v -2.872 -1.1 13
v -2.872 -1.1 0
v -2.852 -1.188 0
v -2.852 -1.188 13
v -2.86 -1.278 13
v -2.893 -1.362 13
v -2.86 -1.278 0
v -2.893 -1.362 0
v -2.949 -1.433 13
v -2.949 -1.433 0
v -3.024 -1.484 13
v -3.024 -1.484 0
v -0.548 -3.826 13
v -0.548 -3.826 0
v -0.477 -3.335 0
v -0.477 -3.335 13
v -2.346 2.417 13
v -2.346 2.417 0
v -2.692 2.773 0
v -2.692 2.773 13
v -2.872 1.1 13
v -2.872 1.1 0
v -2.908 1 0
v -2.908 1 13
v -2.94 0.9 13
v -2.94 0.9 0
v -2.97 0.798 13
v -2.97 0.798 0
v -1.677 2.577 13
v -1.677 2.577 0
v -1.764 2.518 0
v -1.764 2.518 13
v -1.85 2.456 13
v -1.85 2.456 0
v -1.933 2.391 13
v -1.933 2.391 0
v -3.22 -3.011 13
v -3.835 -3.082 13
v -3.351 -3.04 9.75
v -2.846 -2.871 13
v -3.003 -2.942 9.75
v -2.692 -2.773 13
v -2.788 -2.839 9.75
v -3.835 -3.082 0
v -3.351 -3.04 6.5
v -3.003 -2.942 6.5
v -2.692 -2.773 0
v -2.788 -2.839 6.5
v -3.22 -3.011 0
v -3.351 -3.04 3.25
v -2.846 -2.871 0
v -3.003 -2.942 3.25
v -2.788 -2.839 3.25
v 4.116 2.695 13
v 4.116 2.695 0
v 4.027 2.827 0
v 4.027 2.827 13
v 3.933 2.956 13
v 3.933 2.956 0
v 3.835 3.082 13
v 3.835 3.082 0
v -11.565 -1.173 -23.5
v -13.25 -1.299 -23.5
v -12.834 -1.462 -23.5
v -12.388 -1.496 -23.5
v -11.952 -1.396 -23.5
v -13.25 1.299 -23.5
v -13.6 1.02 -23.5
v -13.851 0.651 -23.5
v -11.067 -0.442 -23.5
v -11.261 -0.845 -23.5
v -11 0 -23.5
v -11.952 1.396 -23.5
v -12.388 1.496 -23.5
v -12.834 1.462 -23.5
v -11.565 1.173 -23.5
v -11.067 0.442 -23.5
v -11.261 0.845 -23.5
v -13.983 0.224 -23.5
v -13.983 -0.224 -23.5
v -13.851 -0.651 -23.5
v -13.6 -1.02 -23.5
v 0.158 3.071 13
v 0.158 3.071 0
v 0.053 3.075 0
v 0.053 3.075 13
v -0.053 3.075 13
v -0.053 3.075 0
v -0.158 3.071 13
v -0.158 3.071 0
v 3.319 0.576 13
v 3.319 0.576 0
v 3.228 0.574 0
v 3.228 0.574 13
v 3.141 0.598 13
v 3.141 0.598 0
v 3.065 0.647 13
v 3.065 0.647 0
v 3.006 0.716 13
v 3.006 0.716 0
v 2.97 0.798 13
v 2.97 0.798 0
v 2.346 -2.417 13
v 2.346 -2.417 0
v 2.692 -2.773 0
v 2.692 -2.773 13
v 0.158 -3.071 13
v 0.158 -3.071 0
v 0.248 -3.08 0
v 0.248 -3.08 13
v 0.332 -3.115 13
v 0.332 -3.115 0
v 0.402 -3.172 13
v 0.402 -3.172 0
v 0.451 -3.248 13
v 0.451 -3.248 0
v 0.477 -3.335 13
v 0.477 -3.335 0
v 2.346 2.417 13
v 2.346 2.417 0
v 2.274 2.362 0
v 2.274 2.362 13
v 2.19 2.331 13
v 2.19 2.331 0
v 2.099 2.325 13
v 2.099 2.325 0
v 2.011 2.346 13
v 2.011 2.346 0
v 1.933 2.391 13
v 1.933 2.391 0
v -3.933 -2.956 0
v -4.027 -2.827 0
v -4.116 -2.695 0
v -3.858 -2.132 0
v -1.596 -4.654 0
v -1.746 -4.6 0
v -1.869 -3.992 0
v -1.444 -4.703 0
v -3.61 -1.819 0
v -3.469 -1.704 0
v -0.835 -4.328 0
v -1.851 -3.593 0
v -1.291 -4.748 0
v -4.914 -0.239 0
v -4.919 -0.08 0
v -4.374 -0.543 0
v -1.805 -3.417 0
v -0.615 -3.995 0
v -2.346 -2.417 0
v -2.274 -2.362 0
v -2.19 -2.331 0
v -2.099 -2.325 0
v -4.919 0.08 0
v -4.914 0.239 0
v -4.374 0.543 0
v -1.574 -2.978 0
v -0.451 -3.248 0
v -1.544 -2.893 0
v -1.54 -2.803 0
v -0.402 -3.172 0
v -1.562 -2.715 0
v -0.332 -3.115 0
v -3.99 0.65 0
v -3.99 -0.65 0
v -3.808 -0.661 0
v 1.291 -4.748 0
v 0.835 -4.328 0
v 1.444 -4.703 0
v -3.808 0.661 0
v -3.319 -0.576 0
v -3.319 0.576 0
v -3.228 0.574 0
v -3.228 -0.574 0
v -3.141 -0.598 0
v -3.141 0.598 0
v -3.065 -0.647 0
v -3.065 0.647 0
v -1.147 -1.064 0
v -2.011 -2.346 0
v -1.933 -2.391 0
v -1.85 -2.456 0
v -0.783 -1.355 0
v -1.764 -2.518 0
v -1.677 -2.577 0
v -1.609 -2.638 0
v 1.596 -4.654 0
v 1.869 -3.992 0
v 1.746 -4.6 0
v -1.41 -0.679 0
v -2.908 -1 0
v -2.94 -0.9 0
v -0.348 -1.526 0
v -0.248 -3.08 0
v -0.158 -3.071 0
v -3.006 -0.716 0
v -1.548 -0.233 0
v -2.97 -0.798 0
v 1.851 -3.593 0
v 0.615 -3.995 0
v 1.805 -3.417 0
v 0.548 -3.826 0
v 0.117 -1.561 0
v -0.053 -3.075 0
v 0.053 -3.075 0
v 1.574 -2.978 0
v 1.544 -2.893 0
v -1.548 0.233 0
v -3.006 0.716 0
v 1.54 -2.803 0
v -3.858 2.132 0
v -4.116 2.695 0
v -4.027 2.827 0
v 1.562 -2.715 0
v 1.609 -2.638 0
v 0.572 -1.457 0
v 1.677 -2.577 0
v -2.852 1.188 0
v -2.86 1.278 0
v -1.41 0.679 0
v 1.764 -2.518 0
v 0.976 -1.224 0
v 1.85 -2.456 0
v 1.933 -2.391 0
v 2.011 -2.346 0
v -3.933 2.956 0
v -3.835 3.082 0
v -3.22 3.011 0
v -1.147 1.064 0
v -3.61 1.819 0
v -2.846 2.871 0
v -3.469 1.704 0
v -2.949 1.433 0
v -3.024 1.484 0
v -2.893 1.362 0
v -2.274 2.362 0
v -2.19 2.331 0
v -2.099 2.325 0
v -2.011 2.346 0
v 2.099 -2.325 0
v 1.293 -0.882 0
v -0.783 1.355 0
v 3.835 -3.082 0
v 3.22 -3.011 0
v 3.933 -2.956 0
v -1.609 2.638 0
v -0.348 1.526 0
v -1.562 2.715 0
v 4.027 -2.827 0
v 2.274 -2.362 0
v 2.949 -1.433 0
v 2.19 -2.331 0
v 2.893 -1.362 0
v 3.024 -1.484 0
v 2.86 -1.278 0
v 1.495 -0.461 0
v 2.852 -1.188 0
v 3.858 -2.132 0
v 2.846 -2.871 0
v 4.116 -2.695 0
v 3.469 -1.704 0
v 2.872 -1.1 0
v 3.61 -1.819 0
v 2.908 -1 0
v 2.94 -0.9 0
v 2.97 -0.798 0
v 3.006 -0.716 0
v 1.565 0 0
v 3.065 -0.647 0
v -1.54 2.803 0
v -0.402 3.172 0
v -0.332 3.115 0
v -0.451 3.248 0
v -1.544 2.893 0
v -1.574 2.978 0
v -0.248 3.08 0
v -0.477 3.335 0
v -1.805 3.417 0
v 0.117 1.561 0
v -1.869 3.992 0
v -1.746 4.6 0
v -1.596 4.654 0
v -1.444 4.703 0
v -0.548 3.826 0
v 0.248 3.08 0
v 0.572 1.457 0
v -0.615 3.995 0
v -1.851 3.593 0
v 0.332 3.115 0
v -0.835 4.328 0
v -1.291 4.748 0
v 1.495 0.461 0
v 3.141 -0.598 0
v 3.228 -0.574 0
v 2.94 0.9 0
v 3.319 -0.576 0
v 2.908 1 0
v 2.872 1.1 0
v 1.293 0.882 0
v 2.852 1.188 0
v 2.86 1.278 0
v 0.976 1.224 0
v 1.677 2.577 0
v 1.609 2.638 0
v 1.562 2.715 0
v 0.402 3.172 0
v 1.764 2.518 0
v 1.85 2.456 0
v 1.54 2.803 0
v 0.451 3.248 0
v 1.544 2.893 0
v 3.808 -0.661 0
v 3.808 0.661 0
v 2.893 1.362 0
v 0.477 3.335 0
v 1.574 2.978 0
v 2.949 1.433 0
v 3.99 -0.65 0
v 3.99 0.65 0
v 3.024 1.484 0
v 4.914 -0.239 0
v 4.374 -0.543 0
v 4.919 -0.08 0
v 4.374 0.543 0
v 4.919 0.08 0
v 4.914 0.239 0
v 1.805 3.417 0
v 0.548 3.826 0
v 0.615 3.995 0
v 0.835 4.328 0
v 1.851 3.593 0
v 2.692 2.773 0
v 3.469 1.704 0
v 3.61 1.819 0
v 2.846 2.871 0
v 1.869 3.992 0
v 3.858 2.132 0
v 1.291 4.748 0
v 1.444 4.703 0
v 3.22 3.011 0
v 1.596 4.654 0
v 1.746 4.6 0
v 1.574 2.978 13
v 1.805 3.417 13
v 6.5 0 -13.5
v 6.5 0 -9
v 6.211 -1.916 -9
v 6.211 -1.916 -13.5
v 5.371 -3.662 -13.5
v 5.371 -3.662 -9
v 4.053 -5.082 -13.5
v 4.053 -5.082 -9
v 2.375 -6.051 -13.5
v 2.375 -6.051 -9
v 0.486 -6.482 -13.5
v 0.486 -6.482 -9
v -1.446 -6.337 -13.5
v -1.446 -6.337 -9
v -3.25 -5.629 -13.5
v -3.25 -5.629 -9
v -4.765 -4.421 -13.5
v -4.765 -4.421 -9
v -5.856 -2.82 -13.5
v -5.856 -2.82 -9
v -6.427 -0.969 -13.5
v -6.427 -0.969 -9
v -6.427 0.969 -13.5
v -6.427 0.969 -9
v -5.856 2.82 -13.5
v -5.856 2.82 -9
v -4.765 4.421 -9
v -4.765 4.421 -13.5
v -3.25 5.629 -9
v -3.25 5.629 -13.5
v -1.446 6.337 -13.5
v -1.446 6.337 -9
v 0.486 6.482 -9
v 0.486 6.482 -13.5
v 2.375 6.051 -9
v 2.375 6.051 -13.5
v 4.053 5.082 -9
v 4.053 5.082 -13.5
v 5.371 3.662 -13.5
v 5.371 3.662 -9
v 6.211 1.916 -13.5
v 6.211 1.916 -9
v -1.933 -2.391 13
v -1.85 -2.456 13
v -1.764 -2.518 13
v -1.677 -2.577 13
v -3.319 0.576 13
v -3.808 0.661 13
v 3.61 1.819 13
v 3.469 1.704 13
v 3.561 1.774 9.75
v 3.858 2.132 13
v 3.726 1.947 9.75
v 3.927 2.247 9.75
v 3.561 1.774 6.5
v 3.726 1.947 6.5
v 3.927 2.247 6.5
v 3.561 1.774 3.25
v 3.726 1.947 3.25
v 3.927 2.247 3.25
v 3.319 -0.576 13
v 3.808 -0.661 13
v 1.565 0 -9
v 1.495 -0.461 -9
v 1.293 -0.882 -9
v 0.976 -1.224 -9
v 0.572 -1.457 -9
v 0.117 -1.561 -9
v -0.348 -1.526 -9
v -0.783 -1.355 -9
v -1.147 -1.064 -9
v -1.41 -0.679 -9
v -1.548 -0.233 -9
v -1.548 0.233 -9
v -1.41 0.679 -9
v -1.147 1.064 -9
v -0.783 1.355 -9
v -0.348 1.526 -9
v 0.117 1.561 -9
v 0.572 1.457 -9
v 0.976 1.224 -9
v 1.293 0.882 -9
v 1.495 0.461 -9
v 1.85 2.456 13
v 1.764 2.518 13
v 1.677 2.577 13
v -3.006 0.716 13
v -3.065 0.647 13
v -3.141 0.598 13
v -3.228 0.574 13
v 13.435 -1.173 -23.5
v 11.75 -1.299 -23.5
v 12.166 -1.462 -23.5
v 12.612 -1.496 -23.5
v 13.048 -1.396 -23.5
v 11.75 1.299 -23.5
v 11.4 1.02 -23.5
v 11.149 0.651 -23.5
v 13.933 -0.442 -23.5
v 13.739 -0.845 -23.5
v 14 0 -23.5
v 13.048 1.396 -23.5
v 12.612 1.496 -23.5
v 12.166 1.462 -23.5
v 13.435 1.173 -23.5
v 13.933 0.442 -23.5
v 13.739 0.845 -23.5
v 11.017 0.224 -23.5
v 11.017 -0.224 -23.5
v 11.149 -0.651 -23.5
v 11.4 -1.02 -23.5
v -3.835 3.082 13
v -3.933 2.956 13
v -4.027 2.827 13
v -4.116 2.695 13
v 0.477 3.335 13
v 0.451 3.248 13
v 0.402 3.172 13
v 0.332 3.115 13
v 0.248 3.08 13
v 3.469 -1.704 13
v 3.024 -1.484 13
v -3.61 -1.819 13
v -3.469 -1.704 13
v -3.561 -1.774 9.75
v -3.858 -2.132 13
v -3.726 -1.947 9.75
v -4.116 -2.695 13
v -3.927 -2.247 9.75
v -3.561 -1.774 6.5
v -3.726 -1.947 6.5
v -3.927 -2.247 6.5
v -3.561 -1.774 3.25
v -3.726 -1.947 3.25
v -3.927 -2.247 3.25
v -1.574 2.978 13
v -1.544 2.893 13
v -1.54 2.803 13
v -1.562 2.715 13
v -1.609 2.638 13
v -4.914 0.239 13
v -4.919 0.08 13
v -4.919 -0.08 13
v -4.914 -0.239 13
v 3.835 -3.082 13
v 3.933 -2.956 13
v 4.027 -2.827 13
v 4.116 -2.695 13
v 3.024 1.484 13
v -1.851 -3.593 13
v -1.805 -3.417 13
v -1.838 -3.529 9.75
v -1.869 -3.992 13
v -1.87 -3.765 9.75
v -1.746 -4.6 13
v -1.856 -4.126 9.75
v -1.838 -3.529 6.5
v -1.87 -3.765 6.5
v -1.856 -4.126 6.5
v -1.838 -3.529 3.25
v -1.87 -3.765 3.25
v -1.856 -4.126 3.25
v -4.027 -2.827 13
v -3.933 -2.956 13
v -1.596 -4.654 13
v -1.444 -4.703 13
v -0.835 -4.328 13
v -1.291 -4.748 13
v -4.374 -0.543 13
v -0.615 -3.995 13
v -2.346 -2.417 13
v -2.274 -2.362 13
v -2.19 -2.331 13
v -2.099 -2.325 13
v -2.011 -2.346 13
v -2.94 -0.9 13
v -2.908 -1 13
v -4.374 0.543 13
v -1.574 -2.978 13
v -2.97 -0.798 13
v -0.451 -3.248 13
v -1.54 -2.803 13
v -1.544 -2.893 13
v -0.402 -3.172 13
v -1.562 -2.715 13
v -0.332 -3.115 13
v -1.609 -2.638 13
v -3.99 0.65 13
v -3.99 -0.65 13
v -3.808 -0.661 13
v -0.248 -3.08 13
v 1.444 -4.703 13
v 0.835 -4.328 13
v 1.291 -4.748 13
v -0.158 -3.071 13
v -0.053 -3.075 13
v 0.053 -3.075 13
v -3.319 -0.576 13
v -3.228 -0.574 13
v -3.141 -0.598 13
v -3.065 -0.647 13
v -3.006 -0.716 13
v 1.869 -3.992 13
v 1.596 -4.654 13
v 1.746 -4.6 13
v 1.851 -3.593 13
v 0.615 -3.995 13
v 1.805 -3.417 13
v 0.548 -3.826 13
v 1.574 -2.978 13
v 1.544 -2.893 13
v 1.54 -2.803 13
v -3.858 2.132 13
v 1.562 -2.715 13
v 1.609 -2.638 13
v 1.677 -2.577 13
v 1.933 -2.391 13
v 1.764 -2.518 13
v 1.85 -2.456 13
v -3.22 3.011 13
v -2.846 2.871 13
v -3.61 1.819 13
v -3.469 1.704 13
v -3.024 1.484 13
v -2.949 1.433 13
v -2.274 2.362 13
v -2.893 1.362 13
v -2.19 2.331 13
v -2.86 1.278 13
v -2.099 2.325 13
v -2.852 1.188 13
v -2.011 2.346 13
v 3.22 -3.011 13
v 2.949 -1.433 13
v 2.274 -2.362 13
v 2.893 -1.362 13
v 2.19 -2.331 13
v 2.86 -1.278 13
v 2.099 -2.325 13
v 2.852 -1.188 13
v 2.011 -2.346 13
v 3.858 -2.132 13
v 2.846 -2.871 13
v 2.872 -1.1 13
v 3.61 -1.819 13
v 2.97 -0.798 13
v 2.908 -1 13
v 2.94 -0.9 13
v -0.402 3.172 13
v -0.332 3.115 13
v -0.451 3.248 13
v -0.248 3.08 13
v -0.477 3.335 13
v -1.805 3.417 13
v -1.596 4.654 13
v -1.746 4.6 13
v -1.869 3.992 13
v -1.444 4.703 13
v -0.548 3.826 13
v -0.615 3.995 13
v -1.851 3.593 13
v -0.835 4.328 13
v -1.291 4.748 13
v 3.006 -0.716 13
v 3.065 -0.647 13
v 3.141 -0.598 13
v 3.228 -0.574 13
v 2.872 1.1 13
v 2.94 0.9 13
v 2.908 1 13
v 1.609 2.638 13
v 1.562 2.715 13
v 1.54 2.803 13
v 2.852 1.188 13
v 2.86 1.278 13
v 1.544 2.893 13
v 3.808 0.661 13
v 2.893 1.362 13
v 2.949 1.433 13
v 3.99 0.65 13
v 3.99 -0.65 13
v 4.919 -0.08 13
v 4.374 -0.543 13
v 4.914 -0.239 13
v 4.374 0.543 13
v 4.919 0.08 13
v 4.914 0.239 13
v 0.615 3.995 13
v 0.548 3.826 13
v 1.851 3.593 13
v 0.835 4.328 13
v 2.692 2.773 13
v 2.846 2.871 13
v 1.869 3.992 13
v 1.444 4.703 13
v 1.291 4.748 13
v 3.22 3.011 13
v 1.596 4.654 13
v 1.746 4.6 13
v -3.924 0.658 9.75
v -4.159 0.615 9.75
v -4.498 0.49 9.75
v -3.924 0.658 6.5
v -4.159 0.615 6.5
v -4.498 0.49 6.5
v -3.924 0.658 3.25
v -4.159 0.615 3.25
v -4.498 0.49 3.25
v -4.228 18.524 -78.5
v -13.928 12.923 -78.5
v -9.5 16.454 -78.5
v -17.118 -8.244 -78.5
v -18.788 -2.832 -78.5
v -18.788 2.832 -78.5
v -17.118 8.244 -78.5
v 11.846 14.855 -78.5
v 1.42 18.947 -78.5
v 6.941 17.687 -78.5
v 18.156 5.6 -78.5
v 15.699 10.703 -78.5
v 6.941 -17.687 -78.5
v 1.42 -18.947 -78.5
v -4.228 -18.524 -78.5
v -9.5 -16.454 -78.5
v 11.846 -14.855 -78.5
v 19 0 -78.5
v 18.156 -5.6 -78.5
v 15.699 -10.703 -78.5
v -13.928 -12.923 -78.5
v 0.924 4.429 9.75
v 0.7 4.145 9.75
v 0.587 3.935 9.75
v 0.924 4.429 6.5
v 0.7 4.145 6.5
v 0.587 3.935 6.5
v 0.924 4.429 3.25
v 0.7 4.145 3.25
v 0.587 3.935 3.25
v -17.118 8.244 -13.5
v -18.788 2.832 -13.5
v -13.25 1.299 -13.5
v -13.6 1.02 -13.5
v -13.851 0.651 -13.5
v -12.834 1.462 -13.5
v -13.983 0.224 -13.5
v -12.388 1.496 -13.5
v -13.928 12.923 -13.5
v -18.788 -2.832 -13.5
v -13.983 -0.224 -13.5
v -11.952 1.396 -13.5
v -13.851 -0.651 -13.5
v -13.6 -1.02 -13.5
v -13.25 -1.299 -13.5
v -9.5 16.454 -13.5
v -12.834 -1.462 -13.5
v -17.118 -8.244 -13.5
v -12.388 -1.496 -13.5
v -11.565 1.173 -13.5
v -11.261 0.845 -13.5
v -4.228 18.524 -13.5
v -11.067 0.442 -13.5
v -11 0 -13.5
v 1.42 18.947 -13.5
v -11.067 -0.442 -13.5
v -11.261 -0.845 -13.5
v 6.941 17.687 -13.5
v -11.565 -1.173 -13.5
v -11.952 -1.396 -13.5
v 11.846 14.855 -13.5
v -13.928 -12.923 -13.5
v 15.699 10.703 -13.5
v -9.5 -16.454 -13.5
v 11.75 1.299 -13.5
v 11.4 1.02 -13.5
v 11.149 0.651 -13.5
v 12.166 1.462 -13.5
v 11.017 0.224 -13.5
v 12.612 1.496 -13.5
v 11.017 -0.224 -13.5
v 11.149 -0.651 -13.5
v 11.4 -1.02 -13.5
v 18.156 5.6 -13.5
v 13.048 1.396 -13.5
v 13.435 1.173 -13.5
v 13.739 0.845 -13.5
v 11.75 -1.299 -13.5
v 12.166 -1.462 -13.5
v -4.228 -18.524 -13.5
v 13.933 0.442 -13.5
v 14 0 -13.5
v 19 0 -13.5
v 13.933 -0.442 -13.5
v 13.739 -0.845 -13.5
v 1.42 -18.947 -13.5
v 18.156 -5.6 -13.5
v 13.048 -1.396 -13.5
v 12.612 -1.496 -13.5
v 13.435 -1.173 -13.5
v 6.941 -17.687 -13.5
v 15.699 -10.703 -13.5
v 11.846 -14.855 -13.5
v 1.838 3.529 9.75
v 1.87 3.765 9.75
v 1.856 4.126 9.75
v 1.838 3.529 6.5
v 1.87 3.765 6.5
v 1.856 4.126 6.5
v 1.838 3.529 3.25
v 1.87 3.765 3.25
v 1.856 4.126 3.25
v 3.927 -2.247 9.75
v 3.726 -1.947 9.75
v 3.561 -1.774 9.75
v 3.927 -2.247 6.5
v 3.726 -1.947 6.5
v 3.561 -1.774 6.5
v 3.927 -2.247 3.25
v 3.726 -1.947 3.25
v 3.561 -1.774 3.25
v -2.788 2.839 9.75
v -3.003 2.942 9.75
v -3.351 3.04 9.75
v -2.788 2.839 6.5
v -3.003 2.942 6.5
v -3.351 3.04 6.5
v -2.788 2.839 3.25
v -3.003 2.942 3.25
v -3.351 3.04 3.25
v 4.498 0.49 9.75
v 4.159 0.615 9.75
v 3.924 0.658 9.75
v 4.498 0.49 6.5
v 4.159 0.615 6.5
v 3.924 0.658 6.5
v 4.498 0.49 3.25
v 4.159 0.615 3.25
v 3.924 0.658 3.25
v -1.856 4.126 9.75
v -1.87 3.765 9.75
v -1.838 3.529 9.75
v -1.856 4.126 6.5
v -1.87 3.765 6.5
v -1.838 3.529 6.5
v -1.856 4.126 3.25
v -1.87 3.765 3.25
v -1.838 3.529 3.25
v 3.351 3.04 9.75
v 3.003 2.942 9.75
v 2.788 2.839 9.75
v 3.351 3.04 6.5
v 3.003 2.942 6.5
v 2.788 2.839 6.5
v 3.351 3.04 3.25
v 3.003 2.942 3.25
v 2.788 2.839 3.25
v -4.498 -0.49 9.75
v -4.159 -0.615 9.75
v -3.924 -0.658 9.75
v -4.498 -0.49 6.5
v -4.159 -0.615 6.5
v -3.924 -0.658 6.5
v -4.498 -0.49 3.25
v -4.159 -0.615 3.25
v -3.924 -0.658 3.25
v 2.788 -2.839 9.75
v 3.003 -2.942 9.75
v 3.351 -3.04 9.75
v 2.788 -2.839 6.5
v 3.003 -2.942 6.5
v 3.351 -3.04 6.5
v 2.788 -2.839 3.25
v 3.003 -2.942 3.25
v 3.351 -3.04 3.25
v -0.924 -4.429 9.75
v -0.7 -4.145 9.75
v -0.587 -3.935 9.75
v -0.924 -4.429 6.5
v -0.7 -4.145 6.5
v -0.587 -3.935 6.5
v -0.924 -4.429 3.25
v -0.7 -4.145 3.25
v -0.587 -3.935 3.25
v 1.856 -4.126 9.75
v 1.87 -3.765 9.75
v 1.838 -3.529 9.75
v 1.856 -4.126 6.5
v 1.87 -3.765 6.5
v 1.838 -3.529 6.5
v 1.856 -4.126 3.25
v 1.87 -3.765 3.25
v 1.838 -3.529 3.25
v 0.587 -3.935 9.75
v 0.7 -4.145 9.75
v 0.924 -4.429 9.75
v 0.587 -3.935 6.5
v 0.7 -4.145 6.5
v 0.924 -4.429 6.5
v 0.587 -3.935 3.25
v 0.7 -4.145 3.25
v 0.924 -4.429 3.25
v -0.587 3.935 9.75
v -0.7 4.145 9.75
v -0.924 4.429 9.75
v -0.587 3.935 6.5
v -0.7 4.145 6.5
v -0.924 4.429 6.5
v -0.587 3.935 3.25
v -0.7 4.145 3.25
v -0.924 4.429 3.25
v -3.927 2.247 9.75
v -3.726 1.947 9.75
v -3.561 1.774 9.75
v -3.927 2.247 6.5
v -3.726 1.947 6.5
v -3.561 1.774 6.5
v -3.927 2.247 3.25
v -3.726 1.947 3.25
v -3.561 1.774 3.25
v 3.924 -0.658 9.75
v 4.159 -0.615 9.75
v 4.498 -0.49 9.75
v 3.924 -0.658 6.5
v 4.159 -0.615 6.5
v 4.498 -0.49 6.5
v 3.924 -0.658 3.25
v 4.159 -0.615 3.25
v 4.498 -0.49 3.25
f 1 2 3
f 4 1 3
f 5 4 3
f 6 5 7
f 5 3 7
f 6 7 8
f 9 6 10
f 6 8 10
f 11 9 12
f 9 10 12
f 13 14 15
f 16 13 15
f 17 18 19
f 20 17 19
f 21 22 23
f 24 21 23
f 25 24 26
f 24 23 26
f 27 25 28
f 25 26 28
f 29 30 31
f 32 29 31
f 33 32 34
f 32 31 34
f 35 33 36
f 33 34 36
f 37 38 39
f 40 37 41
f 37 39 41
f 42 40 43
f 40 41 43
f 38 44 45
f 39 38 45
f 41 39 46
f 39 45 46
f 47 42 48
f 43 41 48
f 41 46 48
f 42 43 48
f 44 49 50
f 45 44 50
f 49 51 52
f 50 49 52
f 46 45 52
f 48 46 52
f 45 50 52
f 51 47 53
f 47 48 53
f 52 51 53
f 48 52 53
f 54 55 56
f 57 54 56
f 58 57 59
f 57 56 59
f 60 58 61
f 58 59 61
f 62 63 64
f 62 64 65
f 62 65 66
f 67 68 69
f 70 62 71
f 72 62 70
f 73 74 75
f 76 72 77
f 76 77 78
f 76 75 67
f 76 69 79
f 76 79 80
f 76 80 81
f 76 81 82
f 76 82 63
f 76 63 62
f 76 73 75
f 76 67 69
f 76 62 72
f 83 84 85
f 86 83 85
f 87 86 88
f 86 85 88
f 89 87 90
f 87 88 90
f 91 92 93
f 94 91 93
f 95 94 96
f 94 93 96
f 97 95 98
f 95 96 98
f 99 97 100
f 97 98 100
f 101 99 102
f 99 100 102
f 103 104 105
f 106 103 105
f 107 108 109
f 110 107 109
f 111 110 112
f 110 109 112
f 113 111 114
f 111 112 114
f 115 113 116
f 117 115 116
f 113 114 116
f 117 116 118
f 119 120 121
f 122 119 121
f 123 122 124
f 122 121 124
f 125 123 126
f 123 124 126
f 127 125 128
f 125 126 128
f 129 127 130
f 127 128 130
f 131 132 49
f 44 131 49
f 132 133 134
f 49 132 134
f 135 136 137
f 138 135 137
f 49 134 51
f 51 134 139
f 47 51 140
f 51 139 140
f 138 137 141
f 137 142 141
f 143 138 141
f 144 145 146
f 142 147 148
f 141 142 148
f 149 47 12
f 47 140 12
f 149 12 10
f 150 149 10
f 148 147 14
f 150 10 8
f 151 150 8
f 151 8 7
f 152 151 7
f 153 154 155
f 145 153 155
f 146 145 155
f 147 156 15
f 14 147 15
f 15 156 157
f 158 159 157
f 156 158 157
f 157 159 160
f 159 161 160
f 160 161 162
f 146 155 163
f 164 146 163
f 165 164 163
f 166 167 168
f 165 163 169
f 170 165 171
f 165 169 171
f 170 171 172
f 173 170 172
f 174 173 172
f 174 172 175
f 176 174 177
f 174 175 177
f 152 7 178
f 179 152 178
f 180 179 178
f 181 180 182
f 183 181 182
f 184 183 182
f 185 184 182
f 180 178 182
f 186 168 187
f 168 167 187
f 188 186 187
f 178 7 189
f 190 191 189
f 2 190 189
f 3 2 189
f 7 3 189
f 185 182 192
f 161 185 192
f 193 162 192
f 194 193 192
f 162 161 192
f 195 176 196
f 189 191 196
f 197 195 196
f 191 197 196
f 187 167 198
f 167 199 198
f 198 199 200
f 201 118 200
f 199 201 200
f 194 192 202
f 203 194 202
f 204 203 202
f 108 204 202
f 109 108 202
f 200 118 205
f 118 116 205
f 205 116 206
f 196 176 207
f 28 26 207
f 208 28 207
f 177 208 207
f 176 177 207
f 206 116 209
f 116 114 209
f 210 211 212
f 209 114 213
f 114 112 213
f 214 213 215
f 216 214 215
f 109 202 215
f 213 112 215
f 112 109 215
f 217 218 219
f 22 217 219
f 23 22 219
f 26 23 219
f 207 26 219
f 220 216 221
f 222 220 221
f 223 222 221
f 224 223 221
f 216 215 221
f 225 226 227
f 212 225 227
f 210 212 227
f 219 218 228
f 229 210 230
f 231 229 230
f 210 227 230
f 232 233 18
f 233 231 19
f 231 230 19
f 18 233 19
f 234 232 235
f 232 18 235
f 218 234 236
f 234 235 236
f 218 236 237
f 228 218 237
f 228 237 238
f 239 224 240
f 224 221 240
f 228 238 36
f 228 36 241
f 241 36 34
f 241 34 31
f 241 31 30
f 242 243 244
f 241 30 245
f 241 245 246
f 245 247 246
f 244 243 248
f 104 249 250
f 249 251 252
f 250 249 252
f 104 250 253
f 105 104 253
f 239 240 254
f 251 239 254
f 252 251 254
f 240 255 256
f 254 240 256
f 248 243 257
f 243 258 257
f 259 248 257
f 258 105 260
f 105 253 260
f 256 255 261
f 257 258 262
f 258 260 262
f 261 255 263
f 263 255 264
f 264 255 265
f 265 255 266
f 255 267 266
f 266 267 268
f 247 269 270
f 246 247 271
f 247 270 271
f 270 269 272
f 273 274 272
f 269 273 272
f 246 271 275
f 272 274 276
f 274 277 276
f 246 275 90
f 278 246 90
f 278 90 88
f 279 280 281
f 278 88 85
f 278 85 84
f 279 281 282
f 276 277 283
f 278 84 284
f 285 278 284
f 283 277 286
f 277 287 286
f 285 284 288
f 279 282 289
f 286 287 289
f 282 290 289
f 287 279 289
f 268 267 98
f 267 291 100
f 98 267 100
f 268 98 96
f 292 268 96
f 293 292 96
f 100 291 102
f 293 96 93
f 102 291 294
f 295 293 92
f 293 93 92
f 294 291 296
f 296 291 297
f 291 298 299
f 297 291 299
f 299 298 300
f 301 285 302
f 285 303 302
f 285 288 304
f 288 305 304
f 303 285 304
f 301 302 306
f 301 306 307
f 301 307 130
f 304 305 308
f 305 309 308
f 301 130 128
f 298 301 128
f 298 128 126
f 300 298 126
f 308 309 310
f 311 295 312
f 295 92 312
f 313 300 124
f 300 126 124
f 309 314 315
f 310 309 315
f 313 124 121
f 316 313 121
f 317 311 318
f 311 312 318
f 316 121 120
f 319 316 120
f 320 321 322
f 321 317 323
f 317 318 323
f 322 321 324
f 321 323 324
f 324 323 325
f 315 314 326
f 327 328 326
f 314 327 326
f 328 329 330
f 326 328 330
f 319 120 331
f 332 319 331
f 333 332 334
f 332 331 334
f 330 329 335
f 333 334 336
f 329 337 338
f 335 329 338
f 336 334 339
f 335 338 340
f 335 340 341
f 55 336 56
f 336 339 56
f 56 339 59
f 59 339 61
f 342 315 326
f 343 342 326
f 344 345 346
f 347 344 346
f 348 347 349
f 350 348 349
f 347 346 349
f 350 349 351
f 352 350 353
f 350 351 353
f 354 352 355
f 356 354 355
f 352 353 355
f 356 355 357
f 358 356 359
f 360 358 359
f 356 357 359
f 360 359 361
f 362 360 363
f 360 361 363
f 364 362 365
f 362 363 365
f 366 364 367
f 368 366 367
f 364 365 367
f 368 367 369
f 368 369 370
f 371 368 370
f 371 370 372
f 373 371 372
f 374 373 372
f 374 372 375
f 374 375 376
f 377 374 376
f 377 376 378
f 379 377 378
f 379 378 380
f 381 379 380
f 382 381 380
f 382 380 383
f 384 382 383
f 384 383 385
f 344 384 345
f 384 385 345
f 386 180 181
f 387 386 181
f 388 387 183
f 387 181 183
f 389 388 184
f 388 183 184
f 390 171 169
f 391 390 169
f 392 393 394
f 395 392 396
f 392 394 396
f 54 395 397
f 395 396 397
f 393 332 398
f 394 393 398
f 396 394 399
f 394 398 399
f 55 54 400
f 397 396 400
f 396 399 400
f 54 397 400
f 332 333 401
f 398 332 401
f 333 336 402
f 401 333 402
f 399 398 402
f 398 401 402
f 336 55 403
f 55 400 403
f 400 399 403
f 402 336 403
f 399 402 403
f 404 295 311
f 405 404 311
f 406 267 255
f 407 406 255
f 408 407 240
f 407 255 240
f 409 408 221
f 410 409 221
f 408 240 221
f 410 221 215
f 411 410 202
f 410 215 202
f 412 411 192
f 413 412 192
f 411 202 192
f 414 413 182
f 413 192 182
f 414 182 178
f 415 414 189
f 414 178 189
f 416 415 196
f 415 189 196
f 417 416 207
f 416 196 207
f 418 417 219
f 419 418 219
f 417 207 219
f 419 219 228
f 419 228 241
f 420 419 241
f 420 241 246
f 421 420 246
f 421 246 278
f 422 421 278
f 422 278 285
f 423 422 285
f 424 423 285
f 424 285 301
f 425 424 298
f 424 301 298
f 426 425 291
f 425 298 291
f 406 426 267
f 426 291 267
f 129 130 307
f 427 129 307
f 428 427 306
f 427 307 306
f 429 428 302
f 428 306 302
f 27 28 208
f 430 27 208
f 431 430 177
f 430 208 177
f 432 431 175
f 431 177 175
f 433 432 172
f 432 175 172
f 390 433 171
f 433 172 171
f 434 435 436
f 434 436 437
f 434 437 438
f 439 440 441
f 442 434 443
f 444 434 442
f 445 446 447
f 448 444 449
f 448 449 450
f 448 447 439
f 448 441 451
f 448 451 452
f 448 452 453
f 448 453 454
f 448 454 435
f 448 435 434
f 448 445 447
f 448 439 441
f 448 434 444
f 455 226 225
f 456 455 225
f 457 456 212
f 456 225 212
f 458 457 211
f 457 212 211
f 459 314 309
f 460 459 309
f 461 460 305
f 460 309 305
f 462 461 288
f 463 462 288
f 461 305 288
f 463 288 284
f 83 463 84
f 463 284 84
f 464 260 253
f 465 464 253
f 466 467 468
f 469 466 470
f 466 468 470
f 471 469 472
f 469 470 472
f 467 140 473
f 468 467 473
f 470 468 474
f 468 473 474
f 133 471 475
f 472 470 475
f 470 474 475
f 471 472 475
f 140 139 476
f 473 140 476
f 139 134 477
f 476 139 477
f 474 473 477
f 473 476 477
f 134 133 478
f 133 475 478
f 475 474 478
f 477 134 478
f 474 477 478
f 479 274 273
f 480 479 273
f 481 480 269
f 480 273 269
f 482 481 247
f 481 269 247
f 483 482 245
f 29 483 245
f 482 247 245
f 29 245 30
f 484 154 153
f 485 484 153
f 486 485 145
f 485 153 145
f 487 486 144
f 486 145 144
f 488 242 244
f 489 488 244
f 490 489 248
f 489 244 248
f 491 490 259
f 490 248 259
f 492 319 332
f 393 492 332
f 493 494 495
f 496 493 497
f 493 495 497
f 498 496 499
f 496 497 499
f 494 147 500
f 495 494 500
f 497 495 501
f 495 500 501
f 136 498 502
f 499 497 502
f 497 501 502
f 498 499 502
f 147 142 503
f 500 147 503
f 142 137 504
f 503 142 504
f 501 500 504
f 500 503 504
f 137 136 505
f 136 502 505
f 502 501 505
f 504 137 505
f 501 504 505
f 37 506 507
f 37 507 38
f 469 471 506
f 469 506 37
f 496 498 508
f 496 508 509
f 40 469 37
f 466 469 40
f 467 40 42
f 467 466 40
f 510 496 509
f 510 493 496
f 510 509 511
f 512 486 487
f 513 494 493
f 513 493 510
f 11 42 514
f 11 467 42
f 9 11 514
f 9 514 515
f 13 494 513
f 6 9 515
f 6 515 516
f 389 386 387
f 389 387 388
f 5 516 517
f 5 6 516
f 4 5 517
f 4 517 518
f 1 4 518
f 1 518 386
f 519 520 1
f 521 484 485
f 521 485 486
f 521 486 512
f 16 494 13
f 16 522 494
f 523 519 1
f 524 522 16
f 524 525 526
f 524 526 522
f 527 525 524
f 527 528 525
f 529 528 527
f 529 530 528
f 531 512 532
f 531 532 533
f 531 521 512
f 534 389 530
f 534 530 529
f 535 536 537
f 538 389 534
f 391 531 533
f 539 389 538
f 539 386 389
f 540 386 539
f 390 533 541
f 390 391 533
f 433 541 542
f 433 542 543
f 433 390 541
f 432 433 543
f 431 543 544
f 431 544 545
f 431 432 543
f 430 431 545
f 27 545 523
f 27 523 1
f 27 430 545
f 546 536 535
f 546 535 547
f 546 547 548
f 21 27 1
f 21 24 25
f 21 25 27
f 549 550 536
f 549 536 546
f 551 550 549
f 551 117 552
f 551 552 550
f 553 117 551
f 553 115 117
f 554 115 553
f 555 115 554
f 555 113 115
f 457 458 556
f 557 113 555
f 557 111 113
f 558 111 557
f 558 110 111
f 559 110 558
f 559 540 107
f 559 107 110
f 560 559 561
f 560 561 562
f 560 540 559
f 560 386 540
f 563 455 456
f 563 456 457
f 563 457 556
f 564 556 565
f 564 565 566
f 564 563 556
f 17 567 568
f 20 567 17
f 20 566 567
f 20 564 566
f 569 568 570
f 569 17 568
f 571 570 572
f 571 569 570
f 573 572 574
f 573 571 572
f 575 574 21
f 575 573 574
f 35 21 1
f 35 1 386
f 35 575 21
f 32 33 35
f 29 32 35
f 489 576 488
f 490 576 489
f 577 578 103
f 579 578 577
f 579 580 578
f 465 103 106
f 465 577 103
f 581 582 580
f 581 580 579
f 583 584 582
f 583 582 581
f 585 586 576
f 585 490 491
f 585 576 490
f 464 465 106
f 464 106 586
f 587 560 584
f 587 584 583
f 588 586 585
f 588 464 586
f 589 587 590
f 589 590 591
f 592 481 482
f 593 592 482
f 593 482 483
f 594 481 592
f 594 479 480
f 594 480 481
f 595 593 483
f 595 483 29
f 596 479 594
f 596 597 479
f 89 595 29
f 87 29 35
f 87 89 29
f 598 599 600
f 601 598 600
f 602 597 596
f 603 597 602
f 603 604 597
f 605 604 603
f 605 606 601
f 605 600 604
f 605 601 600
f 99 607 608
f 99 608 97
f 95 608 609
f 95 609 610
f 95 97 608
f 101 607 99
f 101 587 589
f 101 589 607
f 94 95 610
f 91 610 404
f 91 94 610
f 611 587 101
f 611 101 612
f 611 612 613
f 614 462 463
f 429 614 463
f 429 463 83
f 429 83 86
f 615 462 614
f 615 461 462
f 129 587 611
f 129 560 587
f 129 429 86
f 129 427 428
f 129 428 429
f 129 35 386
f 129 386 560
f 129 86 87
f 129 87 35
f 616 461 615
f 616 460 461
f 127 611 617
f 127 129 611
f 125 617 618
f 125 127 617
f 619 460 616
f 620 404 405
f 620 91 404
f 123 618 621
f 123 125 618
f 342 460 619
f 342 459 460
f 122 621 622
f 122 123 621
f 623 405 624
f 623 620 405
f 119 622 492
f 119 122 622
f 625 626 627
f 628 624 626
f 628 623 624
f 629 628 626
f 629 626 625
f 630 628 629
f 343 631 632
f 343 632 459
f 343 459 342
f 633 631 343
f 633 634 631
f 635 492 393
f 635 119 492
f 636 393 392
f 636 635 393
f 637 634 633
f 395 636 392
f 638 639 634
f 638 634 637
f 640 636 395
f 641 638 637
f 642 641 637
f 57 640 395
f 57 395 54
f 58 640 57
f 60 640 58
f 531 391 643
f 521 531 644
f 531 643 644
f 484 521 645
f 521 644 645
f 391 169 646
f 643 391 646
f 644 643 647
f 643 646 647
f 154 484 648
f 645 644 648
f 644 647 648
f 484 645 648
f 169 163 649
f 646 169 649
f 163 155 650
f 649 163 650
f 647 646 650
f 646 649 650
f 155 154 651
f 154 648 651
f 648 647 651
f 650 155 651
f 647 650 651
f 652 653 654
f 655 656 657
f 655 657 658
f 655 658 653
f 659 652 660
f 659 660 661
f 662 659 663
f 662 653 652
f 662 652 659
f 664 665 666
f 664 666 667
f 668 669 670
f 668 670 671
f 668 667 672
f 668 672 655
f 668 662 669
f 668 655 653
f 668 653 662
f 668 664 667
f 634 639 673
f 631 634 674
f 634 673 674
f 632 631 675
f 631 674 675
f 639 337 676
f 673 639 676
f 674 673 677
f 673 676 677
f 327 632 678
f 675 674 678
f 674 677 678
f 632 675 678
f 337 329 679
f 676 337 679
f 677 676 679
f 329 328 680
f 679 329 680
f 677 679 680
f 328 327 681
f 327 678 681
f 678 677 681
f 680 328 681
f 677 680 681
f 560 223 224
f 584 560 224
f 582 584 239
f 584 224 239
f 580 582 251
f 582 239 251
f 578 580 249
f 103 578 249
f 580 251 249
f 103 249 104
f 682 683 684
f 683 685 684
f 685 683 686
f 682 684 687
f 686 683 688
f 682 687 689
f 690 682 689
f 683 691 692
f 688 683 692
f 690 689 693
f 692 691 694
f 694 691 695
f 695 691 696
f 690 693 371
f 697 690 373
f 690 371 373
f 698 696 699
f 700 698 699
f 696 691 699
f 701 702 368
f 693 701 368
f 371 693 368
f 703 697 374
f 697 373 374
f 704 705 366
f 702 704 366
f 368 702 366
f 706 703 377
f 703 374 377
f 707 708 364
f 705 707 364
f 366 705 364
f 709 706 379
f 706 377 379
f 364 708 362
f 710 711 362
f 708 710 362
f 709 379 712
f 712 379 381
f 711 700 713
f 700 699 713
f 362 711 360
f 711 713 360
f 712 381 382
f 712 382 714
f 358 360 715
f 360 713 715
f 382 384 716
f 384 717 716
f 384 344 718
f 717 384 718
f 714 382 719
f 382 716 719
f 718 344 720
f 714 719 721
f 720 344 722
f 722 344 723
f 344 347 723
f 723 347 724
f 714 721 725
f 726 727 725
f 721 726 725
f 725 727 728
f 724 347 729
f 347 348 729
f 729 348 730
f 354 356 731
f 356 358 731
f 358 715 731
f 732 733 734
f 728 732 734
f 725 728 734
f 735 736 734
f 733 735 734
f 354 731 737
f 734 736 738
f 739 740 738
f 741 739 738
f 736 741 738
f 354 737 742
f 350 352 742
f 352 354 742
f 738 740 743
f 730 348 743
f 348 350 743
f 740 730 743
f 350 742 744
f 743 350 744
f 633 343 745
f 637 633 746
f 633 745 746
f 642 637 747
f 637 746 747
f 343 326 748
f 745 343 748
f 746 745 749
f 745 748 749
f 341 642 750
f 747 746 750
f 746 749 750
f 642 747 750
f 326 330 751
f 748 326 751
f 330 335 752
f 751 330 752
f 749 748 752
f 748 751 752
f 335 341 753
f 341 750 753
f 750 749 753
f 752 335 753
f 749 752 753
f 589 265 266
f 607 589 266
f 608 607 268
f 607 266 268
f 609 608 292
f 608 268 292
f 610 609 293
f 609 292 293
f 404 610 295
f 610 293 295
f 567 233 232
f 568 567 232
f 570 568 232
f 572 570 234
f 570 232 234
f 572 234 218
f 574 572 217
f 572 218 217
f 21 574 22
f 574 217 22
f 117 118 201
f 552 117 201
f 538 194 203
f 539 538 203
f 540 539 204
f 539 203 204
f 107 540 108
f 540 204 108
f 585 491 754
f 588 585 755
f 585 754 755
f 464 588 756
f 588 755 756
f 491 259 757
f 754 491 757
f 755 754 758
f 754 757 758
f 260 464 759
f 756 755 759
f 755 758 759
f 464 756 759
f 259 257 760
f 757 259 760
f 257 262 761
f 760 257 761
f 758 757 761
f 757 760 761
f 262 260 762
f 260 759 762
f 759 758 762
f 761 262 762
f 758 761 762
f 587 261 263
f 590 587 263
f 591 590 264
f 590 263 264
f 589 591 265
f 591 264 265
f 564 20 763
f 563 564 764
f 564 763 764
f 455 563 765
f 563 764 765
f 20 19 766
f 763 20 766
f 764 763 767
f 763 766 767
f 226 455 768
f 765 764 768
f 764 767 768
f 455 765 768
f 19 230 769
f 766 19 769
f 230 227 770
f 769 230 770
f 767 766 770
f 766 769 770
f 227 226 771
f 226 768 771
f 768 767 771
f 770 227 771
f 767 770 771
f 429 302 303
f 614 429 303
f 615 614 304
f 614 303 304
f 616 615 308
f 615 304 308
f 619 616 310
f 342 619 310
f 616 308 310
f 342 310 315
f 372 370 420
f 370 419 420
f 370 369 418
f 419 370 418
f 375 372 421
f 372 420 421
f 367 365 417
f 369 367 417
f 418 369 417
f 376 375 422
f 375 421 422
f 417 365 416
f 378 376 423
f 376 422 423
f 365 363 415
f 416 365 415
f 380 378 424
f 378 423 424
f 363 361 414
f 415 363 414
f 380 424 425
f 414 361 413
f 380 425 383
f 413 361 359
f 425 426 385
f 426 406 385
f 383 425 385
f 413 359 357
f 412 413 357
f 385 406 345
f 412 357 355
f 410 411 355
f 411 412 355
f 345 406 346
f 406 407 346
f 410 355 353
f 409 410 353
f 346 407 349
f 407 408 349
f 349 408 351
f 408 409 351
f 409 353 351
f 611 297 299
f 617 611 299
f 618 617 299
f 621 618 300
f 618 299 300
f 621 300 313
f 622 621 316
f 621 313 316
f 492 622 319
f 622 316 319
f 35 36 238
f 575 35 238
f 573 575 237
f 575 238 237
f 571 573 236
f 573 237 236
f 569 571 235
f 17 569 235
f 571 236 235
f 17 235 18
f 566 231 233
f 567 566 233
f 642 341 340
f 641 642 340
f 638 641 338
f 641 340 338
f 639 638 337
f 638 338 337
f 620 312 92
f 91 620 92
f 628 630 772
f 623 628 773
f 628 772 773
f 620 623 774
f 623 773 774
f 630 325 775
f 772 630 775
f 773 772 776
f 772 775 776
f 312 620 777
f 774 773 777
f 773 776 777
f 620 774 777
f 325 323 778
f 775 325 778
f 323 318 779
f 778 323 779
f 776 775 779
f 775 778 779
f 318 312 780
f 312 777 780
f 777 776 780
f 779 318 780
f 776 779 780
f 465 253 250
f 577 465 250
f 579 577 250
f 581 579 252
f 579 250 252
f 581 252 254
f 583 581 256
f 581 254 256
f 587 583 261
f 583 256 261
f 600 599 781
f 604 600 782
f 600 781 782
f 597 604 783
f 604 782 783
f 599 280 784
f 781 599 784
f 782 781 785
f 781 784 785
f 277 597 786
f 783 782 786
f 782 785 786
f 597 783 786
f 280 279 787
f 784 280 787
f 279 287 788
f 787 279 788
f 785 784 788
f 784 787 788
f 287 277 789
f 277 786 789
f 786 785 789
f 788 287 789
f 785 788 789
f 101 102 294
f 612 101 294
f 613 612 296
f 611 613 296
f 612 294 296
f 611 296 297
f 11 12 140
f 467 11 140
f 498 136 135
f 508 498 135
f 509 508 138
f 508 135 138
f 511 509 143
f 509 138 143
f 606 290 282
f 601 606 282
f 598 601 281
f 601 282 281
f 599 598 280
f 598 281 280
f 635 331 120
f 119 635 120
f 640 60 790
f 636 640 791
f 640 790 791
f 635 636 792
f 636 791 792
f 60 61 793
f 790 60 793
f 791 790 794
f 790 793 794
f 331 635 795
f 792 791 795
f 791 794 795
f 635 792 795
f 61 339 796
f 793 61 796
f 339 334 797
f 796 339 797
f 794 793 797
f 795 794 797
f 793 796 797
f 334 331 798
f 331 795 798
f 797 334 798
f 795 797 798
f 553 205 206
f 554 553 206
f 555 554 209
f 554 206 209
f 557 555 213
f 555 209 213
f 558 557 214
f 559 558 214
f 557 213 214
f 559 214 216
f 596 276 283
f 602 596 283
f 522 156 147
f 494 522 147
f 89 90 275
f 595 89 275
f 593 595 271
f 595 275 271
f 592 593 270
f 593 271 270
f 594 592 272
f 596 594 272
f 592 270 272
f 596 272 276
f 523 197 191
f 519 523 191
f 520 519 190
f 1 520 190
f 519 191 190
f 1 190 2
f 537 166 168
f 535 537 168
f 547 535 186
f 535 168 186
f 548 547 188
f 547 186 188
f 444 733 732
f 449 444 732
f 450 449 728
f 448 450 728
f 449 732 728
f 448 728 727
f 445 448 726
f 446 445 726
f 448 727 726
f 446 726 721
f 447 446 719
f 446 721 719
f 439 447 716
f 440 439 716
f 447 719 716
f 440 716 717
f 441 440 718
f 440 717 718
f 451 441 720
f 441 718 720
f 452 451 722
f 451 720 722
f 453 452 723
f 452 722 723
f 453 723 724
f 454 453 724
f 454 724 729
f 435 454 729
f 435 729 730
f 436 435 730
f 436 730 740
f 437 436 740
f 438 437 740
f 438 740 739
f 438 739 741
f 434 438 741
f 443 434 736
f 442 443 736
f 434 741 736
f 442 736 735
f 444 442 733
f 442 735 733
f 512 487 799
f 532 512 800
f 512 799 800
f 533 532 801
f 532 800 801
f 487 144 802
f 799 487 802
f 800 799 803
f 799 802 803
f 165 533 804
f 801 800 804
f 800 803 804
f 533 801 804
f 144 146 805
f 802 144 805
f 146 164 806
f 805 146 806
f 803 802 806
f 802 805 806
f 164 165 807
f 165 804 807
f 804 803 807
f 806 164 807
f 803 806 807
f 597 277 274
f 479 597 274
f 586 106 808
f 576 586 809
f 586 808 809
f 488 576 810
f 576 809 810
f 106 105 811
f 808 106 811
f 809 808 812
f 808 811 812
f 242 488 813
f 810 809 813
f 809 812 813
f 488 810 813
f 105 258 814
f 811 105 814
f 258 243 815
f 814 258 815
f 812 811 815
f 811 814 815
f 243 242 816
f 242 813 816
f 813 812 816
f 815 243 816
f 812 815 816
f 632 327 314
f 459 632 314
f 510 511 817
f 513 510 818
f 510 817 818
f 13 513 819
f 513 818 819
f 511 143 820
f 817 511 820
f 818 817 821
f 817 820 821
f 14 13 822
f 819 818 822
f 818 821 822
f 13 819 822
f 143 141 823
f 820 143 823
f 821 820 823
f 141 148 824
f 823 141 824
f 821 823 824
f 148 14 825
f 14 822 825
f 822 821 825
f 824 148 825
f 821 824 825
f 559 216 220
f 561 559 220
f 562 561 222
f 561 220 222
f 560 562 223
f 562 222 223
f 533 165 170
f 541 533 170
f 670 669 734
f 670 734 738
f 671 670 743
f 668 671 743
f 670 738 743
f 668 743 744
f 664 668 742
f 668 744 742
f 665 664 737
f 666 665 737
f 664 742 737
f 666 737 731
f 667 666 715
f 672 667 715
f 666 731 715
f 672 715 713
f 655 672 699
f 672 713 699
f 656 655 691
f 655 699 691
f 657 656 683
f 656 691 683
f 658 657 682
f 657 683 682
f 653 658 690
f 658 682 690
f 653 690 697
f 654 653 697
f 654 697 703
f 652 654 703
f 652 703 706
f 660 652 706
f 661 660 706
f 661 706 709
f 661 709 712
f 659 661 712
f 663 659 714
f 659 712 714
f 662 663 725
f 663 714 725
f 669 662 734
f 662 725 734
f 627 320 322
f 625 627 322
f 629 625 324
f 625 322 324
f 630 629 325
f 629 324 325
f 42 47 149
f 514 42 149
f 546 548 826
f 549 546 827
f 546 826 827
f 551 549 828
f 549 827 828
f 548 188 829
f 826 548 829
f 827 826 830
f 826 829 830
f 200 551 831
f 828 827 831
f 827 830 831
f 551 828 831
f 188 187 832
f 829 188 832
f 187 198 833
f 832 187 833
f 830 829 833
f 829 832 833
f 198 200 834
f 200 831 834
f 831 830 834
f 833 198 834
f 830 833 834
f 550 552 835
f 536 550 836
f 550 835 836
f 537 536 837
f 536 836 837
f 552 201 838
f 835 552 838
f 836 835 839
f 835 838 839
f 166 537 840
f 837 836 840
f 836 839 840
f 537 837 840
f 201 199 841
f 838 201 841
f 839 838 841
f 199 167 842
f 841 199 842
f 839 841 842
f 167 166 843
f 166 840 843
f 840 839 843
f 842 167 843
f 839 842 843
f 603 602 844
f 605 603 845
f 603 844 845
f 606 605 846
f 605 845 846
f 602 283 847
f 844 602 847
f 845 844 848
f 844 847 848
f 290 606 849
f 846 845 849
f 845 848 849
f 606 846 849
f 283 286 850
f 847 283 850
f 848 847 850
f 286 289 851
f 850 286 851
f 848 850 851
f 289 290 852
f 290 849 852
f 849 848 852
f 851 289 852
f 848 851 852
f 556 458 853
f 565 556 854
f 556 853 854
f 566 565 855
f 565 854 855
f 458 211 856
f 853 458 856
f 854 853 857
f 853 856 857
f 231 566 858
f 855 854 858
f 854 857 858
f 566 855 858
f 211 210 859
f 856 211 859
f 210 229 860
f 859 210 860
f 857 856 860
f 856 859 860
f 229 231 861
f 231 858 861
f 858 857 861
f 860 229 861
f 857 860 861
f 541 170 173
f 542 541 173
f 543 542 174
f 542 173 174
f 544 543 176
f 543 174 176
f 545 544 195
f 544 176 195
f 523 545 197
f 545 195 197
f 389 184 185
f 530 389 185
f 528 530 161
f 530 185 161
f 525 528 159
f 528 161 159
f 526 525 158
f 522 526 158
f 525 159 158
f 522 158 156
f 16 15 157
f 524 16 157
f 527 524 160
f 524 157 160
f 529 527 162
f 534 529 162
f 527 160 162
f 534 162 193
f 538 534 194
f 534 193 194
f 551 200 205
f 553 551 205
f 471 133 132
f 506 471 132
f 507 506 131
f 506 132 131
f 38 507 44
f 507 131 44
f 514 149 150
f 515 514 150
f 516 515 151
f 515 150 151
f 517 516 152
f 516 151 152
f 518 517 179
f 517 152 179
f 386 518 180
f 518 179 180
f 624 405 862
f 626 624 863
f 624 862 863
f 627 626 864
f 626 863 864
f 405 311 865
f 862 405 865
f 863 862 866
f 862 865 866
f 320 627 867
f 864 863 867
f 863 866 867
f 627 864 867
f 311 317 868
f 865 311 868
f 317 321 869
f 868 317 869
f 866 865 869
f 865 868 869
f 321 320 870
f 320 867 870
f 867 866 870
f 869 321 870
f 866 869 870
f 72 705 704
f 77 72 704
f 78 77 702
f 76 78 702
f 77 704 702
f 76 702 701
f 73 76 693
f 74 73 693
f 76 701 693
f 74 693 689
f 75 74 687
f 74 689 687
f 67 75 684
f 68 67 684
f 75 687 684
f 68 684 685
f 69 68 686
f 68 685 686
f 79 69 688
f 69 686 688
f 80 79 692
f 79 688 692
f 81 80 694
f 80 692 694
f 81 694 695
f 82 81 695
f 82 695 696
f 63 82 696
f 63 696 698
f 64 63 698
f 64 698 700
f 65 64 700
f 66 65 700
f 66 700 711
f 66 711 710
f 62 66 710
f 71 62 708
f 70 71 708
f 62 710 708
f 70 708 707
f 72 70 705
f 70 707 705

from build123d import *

# Parameters (mm, degrees)
PAD_DEPTH    = 13
SKETCH_R     = 1.565
PAD001_DEPTH = 9
SKETCH001_R  = 6.5
PAD002_DEPTH = 4.5
SKETCH002_R  = 19
PAD003_DEPTH = 65
SKETCH003_R  = 1.5
POCKET_DEPTH = 10


with BuildPart() as part:
    # InvoluteGear → Pad (new body)
    with BuildSketch(Plane.XY):
        with BuildLine():
            Line((3.318799, -0.576475), (3.808072, -0.660799))
            add(Edge.make_bspline(
                [(3.808072, -0.660799), (3.862649, -0.664033), (4.081437, -0.669431), (4.470105, -0.567144), (4.914097, -0.239417)],
                knots=[0, 0, 0, 0, 0, 1, 1, 1, 1, 1], degree=4))
            ThreePointArc((4.914097, -0.239417), (4.919926, 0), (4.914097, 0.239417))
            add(Edge.make_bspline(
                [(4.914097, 0.239417), (4.470105, 0.567144), (4.081437, 0.669431), (3.862649, 0.664033), (3.808072, 0.660799)],
                knots=[0, 0, 0, 0, 0, 1, 1, 1, 1, 1], degree=4))
            Line((3.808072, 0.660799), (3.318799, 0.576475))
            ThreePointArc((3.318799, 0.576475), (3.101267, 0.619895), (2.969549, 0.798377))
            ThreePointArc((2.969549, 0.798377), (2.924499, 0.950227), (2.871689, 1.099557))
            ThreePointArc((2.871689, 1.099557), (2.873343, 1.321373), (3.023808, 1.484363))
            Line((3.023808, 1.484363), (3.469203, 1.703731))
            add(Edge.make_bspline(
                [(3.469203, 1.703731), (3.515258, 1.733194), (3.695434, 1.857427), (3.94975, 2.168633), (4.116314, 2.694741)],
                knots=[0, 0, 0, 0, 0, 1, 1, 1, 1, 1], degree=4))
            ThreePointArc((4.116314, 2.694741), (3.980304, 2.89186), (3.834862, 3.082127))
            add(Edge.make_bspline(
                [(3.834862, 3.082127), (3.283032, 3.086291), (2.90847, 2.94059), (2.73464, 2.807622), (2.692387, 2.772926)],
                knots=[0, 0, 0, 0, 0, 1, 1, 1, 1, 1], degree=4))
            Line((2.692387, 2.772926), (2.346121, 2.417119))
            ThreePointArc((2.346121, 2.417119), (2.144613, 2.324385), (1.933141, 2.391357))
            ThreePointArc((1.933141, 2.391357), (1.80744, 2.487727), (1.676942, 2.577497))
            ThreePointArc((1.676942, 2.577497), (1.5479, 2.757922), (1.573826, 2.978225))
            Line((1.573826, 2.978225), (1.805216, 3.417494))
            add(Edge.make_bspline(
                [(1.805216, 3.417494), (1.825157, 3.4684), (1.897901, 3.674812), (1.920725, 4.076066), (1.746239, 4.5996)],
                knots=[0, 0, 0, 0, 0, 1, 1, 1, 1, 1], degree=4))
            ThreePointArc((1.746239, 4.5996), (1.520341, 4.679127), (1.29084, 4.747568))
            add(Edge.make_bspline(
                [(1.29084, 4.747568), (0.841952, 4.42658), (0.624566, 4.088543), (0.562092, 3.878795), (0.548302, 3.82589)],
                knots=[0, 0, 0, 0, 0, 1, 1, 1, 1, 1], degree=4))
            Line((0.548302, 3.82589), (0.477305, 3.334506))
            ThreePointArc((0.477305, 3.334506), (0.368789, 3.141038), (0.15834, 3.070921))
            ThreePointArc((0.15834, 3.070921), (0, 3.075), (-0.15834, 3.070921))
            ThreePointArc((-0.15834, 3.070921), (-0.368789, 3.141038), (-0.477305, 3.334506))
            Line((-0.477305, 3.334506), (-0.548302, 3.82589))
            add(Edge.make_bspline(
                [(-0.548302, 3.82589), (-0.562092, 3.878795), (-0.624566, 4.088543), (-0.841952, 4.42658), (-1.29084, 4.747568)],
                knots=[0, 0, 0, 0, 0, 1, 1, 1, 1, 1], degree=4))
            ThreePointArc((-1.29084, 4.747568), (-1.520341, 4.679127), (-1.746239, 4.5996))
            add(Edge.make_bspline(
                [(-1.746239, 4.5996), (-1.920725, 4.076066), (-1.897901, 3.674812), (-1.825157, 3.4684), (-1.805216, 3.417494)],
                knots=[0, 0, 0, 0, 0, 1, 1, 1, 1, 1], degree=4))
            Line((-1.805216, 3.417494), (-1.573826, 2.978225))
            ThreePointArc((-1.573826, 2.978225), (-1.5479, 2.757922), (-1.676942, 2.577497))
            ThreePointArc((-1.676942, 2.577497), (-1.80744, 2.487727), (-1.933141, 2.391357))
            ThreePointArc((-1.933141, 2.391357), (-2.144613, 2.324385), (-2.346121, 2.417119))
            Line((-2.346121, 2.417119), (-2.692387, 2.772926))
            add(Edge.make_bspline(
                [(-2.692387, 2.772926), (-2.73464, 2.807622), (-2.90847, 2.94059), (-3.283032, 3.086291), (-3.834862, 3.082127)],
                knots=[0, 0, 0, 0, 0, 1, 1, 1, 1, 1], degree=4))
            ThreePointArc((-3.834862, 3.082127), (-3.980304, 2.89186), (-4.116314, 2.694741))
            add(Edge.make_bspline(
                [(-4.116314, 2.694741), (-3.94975, 2.168633), (-3.695434, 1.857427), (-3.515258, 1.733194), (-3.469203, 1.703731)],
                knots=[0, 0, 0, 0, 0, 1, 1, 1, 1, 1], degree=4))
            Line((-3.469203, 1.703731), (-3.023808, 1.484363))
            ThreePointArc((-3.023808, 1.484363), (-2.873343, 1.321373), (-2.871689, 1.099557))
            ThreePointArc((-2.871689, 1.099557), (-2.924499, 0.950227), (-2.969549, 0.798377))
            ThreePointArc((-2.969549, 0.798377), (-3.101267, 0.619895), (-3.318799, 0.576475))
            Line((-3.318799, 0.576475), (-3.808072, 0.660799))
            add(Edge.make_bspline(
                [(-3.808072, 0.660799), (-3.862649, 0.664033), (-4.081437, 0.669431), (-4.470105, 0.567144), (-4.914097, 0.239417)],
                knots=[0, 0, 0, 0, 0, 1, 1, 1, 1, 1], degree=4))
            ThreePointArc((-4.914097, 0.239417), (-4.919926, 0), (-4.914097, -0.239417))
            add(Edge.make_bspline(
                [(-4.914097, -0.239417), (-4.470105, -0.567144), (-4.081437, -0.669431), (-3.862649, -0.664033), (-3.808072, -0.660799)],
                knots=[0, 0, 0, 0, 0, 1, 1, 1, 1, 1], degree=4))
            Line((-3.808072, -0.660799), (-3.318799, -0.576475))
            ThreePointArc((-3.318799, -0.576475), (-3.101267, -0.619895), (-2.969549, -0.798377))
            ThreePointArc((-2.969549, -0.798377), (-2.924499, -0.950227), (-2.871689, -1.099557))
            ThreePointArc((-2.871689, -1.099557), (-2.873343, -1.321373), (-3.023808, -1.484363))
            Line((-3.023808, -1.484363), (-3.469203, -1.703731))
            add(Edge.make_bspline(
                [(-3.469203, -1.703731), (-3.515258, -1.733194), (-3.695434, -1.857427), (-3.94975, -2.168633), (-4.116314, -2.694741)],
                knots=[0, 0, 0, 0, 0, 1, 1, 1, 1, 1], degree=4))
            ThreePointArc((-4.116314, -2.694741), (-3.980304, -2.89186), (-3.834862, -3.082127))
            add(Edge.make_bspline(
                [(-3.834862, -3.082127), (-3.283032, -3.086291), (-2.90847, -2.94059), (-2.73464, -2.807622), (-2.692387, -2.772926)],
                knots=[0, 0, 0, 0, 0, 1, 1, 1, 1, 1], degree=4))
            Line((-2.692387, -2.772926), (-2.346121, -2.417119))
            ThreePointArc((-2.346121, -2.417119), (-2.144613, -2.324385), (-1.933141, -2.391357))
            ThreePointArc((-1.933141, -2.391357), (-1.80744, -2.487727), (-1.676942, -2.577497))
            ThreePointArc((-1.676942, -2.577497), (-1.5479, -2.757922), (-1.573826, -2.978225))
            Line((-1.573826, -2.978225), (-1.805216, -3.417494))
            add(Edge.make_bspline(
                [(-1.805216, -3.417494), (-1.825157, -3.4684), (-1.897901, -3.674812), (-1.920725, -4.076066), (-1.746239, -4.5996)],
                knots=[0, 0, 0, 0, 0, 1, 1, 1, 1, 1], degree=4))
            ThreePointArc((-1.746239, -4.5996), (-1.520341, -4.679127), (-1.29084, -4.747568))
            add(Edge.make_bspline(
                [(-1.29084, -4.747568), (-0.841952, -4.42658), (-0.624566, -4.088543), (-0.562092, -3.878795), (-0.548302, -3.82589)],
                knots=[0, 0, 0, 0, 0, 1, 1, 1, 1, 1], degree=4))
            Line((-0.548302, -3.82589), (-0.477305, -3.334506))
            ThreePointArc((-0.477305, -3.334506), (-0.368789, -3.141038), (-0.15834, -3.070921))
            ThreePointArc((-0.15834, -3.070921), (0, -3.075), (0.15834, -3.070921))
            ThreePointArc((0.15834, -3.070921), (0.368789, -3.141038), (0.477305, -3.334506))
            Line((0.477305, -3.334506), (0.548302, -3.82589))
            add(Edge.make_bspline(
                [(0.548302, -3.82589), (0.562092, -3.878795), (0.624566, -4.088543), (0.841952, -4.42658), (1.29084, -4.747568)],
                knots=[0, 0, 0, 0, 0, 1, 1, 1, 1, 1], degree=4))
            ThreePointArc((1.29084, -4.747568), (1.520341, -4.679127), (1.746239, -4.5996))
            add(Edge.make_bspline(
                [(1.746239, -4.5996), (1.920725, -4.076066), (1.897901, -3.674812), (1.825157, -3.4684), (1.805216, -3.417494)],
                knots=[0, 0, 0, 0, 0, 1, 1, 1, 1, 1], degree=4))
            Line((1.805216, -3.417494), (1.573826, -2.978225))
            ThreePointArc((1.573826, -2.978225), (1.5479, -2.757922), (1.676942, -2.577497))
            ThreePointArc((1.676942, -2.577497), (1.80744, -2.487727), (1.933141, -2.391357))
            ThreePointArc((1.933141, -2.391357), (2.144613, -2.324385), (2.346121, -2.417119))
            Line((2.346121, -2.417119), (2.692387, -2.772926))
            add(Edge.make_bspline(
                [(2.692387, -2.772926), (2.73464, -2.807622), (2.90847, -2.94059), (3.283032, -3.086291), (3.834862, -3.082127)],
                knots=[0, 0, 0, 0, 0, 1, 1, 1, 1, 1], degree=4))
            ThreePointArc((3.834862, -3.082127), (3.980304, -2.89186), (4.116314, -2.694741))
            add(Edge.make_bspline(
                [(4.116314, -2.694741), (3.94975, -2.168633), (3.695434, -1.857427), (3.515258, -1.733194), (3.469203, -1.703731)],
                knots=[0, 0, 0, 0, 0, 1, 1, 1, 1, 1], degree=4))
            Line((3.469203, -1.703731), (3.023808, -1.484363))
            ThreePointArc((3.023808, -1.484363), (2.873343, -1.321373), (2.871689, -1.099557))
            ThreePointArc((2.871689, -1.099557), (2.924499, -0.950227), (2.969549, -0.798377))
            ThreePointArc((2.969549, -0.798377), (3.101267, -0.619895), (3.318799, -0.576475))
        make_face()
    extrude(amount=PAD_DEPTH)

    # Sketch (on Face81 of Pad) → Pad001 (join)
    with BuildSketch(Plane(origin=(0, 0, 0), x_dir=(1, 0, 0), z_dir=(0, 0, -1))):
        Circle(SKETCH_R)
    extrude(amount=PAD001_DEPTH)

    # Sketch001 (on Face84 of Pad001) → Pad002 (join)
    with BuildSketch(Plane(origin=(0, 0, -9), x_dir=(1, 0, 0), z_dir=(0, 0, -1))):
        Circle(SKETCH001_R)
    extrude(amount=PAD002_DEPTH)

    # Sketch002 (on Face86 of Pad002) → Pad003 (join)
    with BuildSketch(Plane(origin=(0, 0, -13.5), x_dir=(1, 0, 0), z_dir=(0, 0, -1))):
        Circle(SKETCH002_R)
    extrude(amount=PAD003_DEPTH)

    # Sketch003 (on Face86 of Pad003) → Pocket (cut)
    with BuildSketch(Plane.XY.offset(-13.5)):
        with Locations((12.5, 0)):
            Circle(SKETCH003_R)
        with Locations((-12.5, 0)):
            Circle(SKETCH003_R)
    extrude(amount=-POCKET_DEPTH, mode=Mode.SUBTRACT)


solid = part.part
